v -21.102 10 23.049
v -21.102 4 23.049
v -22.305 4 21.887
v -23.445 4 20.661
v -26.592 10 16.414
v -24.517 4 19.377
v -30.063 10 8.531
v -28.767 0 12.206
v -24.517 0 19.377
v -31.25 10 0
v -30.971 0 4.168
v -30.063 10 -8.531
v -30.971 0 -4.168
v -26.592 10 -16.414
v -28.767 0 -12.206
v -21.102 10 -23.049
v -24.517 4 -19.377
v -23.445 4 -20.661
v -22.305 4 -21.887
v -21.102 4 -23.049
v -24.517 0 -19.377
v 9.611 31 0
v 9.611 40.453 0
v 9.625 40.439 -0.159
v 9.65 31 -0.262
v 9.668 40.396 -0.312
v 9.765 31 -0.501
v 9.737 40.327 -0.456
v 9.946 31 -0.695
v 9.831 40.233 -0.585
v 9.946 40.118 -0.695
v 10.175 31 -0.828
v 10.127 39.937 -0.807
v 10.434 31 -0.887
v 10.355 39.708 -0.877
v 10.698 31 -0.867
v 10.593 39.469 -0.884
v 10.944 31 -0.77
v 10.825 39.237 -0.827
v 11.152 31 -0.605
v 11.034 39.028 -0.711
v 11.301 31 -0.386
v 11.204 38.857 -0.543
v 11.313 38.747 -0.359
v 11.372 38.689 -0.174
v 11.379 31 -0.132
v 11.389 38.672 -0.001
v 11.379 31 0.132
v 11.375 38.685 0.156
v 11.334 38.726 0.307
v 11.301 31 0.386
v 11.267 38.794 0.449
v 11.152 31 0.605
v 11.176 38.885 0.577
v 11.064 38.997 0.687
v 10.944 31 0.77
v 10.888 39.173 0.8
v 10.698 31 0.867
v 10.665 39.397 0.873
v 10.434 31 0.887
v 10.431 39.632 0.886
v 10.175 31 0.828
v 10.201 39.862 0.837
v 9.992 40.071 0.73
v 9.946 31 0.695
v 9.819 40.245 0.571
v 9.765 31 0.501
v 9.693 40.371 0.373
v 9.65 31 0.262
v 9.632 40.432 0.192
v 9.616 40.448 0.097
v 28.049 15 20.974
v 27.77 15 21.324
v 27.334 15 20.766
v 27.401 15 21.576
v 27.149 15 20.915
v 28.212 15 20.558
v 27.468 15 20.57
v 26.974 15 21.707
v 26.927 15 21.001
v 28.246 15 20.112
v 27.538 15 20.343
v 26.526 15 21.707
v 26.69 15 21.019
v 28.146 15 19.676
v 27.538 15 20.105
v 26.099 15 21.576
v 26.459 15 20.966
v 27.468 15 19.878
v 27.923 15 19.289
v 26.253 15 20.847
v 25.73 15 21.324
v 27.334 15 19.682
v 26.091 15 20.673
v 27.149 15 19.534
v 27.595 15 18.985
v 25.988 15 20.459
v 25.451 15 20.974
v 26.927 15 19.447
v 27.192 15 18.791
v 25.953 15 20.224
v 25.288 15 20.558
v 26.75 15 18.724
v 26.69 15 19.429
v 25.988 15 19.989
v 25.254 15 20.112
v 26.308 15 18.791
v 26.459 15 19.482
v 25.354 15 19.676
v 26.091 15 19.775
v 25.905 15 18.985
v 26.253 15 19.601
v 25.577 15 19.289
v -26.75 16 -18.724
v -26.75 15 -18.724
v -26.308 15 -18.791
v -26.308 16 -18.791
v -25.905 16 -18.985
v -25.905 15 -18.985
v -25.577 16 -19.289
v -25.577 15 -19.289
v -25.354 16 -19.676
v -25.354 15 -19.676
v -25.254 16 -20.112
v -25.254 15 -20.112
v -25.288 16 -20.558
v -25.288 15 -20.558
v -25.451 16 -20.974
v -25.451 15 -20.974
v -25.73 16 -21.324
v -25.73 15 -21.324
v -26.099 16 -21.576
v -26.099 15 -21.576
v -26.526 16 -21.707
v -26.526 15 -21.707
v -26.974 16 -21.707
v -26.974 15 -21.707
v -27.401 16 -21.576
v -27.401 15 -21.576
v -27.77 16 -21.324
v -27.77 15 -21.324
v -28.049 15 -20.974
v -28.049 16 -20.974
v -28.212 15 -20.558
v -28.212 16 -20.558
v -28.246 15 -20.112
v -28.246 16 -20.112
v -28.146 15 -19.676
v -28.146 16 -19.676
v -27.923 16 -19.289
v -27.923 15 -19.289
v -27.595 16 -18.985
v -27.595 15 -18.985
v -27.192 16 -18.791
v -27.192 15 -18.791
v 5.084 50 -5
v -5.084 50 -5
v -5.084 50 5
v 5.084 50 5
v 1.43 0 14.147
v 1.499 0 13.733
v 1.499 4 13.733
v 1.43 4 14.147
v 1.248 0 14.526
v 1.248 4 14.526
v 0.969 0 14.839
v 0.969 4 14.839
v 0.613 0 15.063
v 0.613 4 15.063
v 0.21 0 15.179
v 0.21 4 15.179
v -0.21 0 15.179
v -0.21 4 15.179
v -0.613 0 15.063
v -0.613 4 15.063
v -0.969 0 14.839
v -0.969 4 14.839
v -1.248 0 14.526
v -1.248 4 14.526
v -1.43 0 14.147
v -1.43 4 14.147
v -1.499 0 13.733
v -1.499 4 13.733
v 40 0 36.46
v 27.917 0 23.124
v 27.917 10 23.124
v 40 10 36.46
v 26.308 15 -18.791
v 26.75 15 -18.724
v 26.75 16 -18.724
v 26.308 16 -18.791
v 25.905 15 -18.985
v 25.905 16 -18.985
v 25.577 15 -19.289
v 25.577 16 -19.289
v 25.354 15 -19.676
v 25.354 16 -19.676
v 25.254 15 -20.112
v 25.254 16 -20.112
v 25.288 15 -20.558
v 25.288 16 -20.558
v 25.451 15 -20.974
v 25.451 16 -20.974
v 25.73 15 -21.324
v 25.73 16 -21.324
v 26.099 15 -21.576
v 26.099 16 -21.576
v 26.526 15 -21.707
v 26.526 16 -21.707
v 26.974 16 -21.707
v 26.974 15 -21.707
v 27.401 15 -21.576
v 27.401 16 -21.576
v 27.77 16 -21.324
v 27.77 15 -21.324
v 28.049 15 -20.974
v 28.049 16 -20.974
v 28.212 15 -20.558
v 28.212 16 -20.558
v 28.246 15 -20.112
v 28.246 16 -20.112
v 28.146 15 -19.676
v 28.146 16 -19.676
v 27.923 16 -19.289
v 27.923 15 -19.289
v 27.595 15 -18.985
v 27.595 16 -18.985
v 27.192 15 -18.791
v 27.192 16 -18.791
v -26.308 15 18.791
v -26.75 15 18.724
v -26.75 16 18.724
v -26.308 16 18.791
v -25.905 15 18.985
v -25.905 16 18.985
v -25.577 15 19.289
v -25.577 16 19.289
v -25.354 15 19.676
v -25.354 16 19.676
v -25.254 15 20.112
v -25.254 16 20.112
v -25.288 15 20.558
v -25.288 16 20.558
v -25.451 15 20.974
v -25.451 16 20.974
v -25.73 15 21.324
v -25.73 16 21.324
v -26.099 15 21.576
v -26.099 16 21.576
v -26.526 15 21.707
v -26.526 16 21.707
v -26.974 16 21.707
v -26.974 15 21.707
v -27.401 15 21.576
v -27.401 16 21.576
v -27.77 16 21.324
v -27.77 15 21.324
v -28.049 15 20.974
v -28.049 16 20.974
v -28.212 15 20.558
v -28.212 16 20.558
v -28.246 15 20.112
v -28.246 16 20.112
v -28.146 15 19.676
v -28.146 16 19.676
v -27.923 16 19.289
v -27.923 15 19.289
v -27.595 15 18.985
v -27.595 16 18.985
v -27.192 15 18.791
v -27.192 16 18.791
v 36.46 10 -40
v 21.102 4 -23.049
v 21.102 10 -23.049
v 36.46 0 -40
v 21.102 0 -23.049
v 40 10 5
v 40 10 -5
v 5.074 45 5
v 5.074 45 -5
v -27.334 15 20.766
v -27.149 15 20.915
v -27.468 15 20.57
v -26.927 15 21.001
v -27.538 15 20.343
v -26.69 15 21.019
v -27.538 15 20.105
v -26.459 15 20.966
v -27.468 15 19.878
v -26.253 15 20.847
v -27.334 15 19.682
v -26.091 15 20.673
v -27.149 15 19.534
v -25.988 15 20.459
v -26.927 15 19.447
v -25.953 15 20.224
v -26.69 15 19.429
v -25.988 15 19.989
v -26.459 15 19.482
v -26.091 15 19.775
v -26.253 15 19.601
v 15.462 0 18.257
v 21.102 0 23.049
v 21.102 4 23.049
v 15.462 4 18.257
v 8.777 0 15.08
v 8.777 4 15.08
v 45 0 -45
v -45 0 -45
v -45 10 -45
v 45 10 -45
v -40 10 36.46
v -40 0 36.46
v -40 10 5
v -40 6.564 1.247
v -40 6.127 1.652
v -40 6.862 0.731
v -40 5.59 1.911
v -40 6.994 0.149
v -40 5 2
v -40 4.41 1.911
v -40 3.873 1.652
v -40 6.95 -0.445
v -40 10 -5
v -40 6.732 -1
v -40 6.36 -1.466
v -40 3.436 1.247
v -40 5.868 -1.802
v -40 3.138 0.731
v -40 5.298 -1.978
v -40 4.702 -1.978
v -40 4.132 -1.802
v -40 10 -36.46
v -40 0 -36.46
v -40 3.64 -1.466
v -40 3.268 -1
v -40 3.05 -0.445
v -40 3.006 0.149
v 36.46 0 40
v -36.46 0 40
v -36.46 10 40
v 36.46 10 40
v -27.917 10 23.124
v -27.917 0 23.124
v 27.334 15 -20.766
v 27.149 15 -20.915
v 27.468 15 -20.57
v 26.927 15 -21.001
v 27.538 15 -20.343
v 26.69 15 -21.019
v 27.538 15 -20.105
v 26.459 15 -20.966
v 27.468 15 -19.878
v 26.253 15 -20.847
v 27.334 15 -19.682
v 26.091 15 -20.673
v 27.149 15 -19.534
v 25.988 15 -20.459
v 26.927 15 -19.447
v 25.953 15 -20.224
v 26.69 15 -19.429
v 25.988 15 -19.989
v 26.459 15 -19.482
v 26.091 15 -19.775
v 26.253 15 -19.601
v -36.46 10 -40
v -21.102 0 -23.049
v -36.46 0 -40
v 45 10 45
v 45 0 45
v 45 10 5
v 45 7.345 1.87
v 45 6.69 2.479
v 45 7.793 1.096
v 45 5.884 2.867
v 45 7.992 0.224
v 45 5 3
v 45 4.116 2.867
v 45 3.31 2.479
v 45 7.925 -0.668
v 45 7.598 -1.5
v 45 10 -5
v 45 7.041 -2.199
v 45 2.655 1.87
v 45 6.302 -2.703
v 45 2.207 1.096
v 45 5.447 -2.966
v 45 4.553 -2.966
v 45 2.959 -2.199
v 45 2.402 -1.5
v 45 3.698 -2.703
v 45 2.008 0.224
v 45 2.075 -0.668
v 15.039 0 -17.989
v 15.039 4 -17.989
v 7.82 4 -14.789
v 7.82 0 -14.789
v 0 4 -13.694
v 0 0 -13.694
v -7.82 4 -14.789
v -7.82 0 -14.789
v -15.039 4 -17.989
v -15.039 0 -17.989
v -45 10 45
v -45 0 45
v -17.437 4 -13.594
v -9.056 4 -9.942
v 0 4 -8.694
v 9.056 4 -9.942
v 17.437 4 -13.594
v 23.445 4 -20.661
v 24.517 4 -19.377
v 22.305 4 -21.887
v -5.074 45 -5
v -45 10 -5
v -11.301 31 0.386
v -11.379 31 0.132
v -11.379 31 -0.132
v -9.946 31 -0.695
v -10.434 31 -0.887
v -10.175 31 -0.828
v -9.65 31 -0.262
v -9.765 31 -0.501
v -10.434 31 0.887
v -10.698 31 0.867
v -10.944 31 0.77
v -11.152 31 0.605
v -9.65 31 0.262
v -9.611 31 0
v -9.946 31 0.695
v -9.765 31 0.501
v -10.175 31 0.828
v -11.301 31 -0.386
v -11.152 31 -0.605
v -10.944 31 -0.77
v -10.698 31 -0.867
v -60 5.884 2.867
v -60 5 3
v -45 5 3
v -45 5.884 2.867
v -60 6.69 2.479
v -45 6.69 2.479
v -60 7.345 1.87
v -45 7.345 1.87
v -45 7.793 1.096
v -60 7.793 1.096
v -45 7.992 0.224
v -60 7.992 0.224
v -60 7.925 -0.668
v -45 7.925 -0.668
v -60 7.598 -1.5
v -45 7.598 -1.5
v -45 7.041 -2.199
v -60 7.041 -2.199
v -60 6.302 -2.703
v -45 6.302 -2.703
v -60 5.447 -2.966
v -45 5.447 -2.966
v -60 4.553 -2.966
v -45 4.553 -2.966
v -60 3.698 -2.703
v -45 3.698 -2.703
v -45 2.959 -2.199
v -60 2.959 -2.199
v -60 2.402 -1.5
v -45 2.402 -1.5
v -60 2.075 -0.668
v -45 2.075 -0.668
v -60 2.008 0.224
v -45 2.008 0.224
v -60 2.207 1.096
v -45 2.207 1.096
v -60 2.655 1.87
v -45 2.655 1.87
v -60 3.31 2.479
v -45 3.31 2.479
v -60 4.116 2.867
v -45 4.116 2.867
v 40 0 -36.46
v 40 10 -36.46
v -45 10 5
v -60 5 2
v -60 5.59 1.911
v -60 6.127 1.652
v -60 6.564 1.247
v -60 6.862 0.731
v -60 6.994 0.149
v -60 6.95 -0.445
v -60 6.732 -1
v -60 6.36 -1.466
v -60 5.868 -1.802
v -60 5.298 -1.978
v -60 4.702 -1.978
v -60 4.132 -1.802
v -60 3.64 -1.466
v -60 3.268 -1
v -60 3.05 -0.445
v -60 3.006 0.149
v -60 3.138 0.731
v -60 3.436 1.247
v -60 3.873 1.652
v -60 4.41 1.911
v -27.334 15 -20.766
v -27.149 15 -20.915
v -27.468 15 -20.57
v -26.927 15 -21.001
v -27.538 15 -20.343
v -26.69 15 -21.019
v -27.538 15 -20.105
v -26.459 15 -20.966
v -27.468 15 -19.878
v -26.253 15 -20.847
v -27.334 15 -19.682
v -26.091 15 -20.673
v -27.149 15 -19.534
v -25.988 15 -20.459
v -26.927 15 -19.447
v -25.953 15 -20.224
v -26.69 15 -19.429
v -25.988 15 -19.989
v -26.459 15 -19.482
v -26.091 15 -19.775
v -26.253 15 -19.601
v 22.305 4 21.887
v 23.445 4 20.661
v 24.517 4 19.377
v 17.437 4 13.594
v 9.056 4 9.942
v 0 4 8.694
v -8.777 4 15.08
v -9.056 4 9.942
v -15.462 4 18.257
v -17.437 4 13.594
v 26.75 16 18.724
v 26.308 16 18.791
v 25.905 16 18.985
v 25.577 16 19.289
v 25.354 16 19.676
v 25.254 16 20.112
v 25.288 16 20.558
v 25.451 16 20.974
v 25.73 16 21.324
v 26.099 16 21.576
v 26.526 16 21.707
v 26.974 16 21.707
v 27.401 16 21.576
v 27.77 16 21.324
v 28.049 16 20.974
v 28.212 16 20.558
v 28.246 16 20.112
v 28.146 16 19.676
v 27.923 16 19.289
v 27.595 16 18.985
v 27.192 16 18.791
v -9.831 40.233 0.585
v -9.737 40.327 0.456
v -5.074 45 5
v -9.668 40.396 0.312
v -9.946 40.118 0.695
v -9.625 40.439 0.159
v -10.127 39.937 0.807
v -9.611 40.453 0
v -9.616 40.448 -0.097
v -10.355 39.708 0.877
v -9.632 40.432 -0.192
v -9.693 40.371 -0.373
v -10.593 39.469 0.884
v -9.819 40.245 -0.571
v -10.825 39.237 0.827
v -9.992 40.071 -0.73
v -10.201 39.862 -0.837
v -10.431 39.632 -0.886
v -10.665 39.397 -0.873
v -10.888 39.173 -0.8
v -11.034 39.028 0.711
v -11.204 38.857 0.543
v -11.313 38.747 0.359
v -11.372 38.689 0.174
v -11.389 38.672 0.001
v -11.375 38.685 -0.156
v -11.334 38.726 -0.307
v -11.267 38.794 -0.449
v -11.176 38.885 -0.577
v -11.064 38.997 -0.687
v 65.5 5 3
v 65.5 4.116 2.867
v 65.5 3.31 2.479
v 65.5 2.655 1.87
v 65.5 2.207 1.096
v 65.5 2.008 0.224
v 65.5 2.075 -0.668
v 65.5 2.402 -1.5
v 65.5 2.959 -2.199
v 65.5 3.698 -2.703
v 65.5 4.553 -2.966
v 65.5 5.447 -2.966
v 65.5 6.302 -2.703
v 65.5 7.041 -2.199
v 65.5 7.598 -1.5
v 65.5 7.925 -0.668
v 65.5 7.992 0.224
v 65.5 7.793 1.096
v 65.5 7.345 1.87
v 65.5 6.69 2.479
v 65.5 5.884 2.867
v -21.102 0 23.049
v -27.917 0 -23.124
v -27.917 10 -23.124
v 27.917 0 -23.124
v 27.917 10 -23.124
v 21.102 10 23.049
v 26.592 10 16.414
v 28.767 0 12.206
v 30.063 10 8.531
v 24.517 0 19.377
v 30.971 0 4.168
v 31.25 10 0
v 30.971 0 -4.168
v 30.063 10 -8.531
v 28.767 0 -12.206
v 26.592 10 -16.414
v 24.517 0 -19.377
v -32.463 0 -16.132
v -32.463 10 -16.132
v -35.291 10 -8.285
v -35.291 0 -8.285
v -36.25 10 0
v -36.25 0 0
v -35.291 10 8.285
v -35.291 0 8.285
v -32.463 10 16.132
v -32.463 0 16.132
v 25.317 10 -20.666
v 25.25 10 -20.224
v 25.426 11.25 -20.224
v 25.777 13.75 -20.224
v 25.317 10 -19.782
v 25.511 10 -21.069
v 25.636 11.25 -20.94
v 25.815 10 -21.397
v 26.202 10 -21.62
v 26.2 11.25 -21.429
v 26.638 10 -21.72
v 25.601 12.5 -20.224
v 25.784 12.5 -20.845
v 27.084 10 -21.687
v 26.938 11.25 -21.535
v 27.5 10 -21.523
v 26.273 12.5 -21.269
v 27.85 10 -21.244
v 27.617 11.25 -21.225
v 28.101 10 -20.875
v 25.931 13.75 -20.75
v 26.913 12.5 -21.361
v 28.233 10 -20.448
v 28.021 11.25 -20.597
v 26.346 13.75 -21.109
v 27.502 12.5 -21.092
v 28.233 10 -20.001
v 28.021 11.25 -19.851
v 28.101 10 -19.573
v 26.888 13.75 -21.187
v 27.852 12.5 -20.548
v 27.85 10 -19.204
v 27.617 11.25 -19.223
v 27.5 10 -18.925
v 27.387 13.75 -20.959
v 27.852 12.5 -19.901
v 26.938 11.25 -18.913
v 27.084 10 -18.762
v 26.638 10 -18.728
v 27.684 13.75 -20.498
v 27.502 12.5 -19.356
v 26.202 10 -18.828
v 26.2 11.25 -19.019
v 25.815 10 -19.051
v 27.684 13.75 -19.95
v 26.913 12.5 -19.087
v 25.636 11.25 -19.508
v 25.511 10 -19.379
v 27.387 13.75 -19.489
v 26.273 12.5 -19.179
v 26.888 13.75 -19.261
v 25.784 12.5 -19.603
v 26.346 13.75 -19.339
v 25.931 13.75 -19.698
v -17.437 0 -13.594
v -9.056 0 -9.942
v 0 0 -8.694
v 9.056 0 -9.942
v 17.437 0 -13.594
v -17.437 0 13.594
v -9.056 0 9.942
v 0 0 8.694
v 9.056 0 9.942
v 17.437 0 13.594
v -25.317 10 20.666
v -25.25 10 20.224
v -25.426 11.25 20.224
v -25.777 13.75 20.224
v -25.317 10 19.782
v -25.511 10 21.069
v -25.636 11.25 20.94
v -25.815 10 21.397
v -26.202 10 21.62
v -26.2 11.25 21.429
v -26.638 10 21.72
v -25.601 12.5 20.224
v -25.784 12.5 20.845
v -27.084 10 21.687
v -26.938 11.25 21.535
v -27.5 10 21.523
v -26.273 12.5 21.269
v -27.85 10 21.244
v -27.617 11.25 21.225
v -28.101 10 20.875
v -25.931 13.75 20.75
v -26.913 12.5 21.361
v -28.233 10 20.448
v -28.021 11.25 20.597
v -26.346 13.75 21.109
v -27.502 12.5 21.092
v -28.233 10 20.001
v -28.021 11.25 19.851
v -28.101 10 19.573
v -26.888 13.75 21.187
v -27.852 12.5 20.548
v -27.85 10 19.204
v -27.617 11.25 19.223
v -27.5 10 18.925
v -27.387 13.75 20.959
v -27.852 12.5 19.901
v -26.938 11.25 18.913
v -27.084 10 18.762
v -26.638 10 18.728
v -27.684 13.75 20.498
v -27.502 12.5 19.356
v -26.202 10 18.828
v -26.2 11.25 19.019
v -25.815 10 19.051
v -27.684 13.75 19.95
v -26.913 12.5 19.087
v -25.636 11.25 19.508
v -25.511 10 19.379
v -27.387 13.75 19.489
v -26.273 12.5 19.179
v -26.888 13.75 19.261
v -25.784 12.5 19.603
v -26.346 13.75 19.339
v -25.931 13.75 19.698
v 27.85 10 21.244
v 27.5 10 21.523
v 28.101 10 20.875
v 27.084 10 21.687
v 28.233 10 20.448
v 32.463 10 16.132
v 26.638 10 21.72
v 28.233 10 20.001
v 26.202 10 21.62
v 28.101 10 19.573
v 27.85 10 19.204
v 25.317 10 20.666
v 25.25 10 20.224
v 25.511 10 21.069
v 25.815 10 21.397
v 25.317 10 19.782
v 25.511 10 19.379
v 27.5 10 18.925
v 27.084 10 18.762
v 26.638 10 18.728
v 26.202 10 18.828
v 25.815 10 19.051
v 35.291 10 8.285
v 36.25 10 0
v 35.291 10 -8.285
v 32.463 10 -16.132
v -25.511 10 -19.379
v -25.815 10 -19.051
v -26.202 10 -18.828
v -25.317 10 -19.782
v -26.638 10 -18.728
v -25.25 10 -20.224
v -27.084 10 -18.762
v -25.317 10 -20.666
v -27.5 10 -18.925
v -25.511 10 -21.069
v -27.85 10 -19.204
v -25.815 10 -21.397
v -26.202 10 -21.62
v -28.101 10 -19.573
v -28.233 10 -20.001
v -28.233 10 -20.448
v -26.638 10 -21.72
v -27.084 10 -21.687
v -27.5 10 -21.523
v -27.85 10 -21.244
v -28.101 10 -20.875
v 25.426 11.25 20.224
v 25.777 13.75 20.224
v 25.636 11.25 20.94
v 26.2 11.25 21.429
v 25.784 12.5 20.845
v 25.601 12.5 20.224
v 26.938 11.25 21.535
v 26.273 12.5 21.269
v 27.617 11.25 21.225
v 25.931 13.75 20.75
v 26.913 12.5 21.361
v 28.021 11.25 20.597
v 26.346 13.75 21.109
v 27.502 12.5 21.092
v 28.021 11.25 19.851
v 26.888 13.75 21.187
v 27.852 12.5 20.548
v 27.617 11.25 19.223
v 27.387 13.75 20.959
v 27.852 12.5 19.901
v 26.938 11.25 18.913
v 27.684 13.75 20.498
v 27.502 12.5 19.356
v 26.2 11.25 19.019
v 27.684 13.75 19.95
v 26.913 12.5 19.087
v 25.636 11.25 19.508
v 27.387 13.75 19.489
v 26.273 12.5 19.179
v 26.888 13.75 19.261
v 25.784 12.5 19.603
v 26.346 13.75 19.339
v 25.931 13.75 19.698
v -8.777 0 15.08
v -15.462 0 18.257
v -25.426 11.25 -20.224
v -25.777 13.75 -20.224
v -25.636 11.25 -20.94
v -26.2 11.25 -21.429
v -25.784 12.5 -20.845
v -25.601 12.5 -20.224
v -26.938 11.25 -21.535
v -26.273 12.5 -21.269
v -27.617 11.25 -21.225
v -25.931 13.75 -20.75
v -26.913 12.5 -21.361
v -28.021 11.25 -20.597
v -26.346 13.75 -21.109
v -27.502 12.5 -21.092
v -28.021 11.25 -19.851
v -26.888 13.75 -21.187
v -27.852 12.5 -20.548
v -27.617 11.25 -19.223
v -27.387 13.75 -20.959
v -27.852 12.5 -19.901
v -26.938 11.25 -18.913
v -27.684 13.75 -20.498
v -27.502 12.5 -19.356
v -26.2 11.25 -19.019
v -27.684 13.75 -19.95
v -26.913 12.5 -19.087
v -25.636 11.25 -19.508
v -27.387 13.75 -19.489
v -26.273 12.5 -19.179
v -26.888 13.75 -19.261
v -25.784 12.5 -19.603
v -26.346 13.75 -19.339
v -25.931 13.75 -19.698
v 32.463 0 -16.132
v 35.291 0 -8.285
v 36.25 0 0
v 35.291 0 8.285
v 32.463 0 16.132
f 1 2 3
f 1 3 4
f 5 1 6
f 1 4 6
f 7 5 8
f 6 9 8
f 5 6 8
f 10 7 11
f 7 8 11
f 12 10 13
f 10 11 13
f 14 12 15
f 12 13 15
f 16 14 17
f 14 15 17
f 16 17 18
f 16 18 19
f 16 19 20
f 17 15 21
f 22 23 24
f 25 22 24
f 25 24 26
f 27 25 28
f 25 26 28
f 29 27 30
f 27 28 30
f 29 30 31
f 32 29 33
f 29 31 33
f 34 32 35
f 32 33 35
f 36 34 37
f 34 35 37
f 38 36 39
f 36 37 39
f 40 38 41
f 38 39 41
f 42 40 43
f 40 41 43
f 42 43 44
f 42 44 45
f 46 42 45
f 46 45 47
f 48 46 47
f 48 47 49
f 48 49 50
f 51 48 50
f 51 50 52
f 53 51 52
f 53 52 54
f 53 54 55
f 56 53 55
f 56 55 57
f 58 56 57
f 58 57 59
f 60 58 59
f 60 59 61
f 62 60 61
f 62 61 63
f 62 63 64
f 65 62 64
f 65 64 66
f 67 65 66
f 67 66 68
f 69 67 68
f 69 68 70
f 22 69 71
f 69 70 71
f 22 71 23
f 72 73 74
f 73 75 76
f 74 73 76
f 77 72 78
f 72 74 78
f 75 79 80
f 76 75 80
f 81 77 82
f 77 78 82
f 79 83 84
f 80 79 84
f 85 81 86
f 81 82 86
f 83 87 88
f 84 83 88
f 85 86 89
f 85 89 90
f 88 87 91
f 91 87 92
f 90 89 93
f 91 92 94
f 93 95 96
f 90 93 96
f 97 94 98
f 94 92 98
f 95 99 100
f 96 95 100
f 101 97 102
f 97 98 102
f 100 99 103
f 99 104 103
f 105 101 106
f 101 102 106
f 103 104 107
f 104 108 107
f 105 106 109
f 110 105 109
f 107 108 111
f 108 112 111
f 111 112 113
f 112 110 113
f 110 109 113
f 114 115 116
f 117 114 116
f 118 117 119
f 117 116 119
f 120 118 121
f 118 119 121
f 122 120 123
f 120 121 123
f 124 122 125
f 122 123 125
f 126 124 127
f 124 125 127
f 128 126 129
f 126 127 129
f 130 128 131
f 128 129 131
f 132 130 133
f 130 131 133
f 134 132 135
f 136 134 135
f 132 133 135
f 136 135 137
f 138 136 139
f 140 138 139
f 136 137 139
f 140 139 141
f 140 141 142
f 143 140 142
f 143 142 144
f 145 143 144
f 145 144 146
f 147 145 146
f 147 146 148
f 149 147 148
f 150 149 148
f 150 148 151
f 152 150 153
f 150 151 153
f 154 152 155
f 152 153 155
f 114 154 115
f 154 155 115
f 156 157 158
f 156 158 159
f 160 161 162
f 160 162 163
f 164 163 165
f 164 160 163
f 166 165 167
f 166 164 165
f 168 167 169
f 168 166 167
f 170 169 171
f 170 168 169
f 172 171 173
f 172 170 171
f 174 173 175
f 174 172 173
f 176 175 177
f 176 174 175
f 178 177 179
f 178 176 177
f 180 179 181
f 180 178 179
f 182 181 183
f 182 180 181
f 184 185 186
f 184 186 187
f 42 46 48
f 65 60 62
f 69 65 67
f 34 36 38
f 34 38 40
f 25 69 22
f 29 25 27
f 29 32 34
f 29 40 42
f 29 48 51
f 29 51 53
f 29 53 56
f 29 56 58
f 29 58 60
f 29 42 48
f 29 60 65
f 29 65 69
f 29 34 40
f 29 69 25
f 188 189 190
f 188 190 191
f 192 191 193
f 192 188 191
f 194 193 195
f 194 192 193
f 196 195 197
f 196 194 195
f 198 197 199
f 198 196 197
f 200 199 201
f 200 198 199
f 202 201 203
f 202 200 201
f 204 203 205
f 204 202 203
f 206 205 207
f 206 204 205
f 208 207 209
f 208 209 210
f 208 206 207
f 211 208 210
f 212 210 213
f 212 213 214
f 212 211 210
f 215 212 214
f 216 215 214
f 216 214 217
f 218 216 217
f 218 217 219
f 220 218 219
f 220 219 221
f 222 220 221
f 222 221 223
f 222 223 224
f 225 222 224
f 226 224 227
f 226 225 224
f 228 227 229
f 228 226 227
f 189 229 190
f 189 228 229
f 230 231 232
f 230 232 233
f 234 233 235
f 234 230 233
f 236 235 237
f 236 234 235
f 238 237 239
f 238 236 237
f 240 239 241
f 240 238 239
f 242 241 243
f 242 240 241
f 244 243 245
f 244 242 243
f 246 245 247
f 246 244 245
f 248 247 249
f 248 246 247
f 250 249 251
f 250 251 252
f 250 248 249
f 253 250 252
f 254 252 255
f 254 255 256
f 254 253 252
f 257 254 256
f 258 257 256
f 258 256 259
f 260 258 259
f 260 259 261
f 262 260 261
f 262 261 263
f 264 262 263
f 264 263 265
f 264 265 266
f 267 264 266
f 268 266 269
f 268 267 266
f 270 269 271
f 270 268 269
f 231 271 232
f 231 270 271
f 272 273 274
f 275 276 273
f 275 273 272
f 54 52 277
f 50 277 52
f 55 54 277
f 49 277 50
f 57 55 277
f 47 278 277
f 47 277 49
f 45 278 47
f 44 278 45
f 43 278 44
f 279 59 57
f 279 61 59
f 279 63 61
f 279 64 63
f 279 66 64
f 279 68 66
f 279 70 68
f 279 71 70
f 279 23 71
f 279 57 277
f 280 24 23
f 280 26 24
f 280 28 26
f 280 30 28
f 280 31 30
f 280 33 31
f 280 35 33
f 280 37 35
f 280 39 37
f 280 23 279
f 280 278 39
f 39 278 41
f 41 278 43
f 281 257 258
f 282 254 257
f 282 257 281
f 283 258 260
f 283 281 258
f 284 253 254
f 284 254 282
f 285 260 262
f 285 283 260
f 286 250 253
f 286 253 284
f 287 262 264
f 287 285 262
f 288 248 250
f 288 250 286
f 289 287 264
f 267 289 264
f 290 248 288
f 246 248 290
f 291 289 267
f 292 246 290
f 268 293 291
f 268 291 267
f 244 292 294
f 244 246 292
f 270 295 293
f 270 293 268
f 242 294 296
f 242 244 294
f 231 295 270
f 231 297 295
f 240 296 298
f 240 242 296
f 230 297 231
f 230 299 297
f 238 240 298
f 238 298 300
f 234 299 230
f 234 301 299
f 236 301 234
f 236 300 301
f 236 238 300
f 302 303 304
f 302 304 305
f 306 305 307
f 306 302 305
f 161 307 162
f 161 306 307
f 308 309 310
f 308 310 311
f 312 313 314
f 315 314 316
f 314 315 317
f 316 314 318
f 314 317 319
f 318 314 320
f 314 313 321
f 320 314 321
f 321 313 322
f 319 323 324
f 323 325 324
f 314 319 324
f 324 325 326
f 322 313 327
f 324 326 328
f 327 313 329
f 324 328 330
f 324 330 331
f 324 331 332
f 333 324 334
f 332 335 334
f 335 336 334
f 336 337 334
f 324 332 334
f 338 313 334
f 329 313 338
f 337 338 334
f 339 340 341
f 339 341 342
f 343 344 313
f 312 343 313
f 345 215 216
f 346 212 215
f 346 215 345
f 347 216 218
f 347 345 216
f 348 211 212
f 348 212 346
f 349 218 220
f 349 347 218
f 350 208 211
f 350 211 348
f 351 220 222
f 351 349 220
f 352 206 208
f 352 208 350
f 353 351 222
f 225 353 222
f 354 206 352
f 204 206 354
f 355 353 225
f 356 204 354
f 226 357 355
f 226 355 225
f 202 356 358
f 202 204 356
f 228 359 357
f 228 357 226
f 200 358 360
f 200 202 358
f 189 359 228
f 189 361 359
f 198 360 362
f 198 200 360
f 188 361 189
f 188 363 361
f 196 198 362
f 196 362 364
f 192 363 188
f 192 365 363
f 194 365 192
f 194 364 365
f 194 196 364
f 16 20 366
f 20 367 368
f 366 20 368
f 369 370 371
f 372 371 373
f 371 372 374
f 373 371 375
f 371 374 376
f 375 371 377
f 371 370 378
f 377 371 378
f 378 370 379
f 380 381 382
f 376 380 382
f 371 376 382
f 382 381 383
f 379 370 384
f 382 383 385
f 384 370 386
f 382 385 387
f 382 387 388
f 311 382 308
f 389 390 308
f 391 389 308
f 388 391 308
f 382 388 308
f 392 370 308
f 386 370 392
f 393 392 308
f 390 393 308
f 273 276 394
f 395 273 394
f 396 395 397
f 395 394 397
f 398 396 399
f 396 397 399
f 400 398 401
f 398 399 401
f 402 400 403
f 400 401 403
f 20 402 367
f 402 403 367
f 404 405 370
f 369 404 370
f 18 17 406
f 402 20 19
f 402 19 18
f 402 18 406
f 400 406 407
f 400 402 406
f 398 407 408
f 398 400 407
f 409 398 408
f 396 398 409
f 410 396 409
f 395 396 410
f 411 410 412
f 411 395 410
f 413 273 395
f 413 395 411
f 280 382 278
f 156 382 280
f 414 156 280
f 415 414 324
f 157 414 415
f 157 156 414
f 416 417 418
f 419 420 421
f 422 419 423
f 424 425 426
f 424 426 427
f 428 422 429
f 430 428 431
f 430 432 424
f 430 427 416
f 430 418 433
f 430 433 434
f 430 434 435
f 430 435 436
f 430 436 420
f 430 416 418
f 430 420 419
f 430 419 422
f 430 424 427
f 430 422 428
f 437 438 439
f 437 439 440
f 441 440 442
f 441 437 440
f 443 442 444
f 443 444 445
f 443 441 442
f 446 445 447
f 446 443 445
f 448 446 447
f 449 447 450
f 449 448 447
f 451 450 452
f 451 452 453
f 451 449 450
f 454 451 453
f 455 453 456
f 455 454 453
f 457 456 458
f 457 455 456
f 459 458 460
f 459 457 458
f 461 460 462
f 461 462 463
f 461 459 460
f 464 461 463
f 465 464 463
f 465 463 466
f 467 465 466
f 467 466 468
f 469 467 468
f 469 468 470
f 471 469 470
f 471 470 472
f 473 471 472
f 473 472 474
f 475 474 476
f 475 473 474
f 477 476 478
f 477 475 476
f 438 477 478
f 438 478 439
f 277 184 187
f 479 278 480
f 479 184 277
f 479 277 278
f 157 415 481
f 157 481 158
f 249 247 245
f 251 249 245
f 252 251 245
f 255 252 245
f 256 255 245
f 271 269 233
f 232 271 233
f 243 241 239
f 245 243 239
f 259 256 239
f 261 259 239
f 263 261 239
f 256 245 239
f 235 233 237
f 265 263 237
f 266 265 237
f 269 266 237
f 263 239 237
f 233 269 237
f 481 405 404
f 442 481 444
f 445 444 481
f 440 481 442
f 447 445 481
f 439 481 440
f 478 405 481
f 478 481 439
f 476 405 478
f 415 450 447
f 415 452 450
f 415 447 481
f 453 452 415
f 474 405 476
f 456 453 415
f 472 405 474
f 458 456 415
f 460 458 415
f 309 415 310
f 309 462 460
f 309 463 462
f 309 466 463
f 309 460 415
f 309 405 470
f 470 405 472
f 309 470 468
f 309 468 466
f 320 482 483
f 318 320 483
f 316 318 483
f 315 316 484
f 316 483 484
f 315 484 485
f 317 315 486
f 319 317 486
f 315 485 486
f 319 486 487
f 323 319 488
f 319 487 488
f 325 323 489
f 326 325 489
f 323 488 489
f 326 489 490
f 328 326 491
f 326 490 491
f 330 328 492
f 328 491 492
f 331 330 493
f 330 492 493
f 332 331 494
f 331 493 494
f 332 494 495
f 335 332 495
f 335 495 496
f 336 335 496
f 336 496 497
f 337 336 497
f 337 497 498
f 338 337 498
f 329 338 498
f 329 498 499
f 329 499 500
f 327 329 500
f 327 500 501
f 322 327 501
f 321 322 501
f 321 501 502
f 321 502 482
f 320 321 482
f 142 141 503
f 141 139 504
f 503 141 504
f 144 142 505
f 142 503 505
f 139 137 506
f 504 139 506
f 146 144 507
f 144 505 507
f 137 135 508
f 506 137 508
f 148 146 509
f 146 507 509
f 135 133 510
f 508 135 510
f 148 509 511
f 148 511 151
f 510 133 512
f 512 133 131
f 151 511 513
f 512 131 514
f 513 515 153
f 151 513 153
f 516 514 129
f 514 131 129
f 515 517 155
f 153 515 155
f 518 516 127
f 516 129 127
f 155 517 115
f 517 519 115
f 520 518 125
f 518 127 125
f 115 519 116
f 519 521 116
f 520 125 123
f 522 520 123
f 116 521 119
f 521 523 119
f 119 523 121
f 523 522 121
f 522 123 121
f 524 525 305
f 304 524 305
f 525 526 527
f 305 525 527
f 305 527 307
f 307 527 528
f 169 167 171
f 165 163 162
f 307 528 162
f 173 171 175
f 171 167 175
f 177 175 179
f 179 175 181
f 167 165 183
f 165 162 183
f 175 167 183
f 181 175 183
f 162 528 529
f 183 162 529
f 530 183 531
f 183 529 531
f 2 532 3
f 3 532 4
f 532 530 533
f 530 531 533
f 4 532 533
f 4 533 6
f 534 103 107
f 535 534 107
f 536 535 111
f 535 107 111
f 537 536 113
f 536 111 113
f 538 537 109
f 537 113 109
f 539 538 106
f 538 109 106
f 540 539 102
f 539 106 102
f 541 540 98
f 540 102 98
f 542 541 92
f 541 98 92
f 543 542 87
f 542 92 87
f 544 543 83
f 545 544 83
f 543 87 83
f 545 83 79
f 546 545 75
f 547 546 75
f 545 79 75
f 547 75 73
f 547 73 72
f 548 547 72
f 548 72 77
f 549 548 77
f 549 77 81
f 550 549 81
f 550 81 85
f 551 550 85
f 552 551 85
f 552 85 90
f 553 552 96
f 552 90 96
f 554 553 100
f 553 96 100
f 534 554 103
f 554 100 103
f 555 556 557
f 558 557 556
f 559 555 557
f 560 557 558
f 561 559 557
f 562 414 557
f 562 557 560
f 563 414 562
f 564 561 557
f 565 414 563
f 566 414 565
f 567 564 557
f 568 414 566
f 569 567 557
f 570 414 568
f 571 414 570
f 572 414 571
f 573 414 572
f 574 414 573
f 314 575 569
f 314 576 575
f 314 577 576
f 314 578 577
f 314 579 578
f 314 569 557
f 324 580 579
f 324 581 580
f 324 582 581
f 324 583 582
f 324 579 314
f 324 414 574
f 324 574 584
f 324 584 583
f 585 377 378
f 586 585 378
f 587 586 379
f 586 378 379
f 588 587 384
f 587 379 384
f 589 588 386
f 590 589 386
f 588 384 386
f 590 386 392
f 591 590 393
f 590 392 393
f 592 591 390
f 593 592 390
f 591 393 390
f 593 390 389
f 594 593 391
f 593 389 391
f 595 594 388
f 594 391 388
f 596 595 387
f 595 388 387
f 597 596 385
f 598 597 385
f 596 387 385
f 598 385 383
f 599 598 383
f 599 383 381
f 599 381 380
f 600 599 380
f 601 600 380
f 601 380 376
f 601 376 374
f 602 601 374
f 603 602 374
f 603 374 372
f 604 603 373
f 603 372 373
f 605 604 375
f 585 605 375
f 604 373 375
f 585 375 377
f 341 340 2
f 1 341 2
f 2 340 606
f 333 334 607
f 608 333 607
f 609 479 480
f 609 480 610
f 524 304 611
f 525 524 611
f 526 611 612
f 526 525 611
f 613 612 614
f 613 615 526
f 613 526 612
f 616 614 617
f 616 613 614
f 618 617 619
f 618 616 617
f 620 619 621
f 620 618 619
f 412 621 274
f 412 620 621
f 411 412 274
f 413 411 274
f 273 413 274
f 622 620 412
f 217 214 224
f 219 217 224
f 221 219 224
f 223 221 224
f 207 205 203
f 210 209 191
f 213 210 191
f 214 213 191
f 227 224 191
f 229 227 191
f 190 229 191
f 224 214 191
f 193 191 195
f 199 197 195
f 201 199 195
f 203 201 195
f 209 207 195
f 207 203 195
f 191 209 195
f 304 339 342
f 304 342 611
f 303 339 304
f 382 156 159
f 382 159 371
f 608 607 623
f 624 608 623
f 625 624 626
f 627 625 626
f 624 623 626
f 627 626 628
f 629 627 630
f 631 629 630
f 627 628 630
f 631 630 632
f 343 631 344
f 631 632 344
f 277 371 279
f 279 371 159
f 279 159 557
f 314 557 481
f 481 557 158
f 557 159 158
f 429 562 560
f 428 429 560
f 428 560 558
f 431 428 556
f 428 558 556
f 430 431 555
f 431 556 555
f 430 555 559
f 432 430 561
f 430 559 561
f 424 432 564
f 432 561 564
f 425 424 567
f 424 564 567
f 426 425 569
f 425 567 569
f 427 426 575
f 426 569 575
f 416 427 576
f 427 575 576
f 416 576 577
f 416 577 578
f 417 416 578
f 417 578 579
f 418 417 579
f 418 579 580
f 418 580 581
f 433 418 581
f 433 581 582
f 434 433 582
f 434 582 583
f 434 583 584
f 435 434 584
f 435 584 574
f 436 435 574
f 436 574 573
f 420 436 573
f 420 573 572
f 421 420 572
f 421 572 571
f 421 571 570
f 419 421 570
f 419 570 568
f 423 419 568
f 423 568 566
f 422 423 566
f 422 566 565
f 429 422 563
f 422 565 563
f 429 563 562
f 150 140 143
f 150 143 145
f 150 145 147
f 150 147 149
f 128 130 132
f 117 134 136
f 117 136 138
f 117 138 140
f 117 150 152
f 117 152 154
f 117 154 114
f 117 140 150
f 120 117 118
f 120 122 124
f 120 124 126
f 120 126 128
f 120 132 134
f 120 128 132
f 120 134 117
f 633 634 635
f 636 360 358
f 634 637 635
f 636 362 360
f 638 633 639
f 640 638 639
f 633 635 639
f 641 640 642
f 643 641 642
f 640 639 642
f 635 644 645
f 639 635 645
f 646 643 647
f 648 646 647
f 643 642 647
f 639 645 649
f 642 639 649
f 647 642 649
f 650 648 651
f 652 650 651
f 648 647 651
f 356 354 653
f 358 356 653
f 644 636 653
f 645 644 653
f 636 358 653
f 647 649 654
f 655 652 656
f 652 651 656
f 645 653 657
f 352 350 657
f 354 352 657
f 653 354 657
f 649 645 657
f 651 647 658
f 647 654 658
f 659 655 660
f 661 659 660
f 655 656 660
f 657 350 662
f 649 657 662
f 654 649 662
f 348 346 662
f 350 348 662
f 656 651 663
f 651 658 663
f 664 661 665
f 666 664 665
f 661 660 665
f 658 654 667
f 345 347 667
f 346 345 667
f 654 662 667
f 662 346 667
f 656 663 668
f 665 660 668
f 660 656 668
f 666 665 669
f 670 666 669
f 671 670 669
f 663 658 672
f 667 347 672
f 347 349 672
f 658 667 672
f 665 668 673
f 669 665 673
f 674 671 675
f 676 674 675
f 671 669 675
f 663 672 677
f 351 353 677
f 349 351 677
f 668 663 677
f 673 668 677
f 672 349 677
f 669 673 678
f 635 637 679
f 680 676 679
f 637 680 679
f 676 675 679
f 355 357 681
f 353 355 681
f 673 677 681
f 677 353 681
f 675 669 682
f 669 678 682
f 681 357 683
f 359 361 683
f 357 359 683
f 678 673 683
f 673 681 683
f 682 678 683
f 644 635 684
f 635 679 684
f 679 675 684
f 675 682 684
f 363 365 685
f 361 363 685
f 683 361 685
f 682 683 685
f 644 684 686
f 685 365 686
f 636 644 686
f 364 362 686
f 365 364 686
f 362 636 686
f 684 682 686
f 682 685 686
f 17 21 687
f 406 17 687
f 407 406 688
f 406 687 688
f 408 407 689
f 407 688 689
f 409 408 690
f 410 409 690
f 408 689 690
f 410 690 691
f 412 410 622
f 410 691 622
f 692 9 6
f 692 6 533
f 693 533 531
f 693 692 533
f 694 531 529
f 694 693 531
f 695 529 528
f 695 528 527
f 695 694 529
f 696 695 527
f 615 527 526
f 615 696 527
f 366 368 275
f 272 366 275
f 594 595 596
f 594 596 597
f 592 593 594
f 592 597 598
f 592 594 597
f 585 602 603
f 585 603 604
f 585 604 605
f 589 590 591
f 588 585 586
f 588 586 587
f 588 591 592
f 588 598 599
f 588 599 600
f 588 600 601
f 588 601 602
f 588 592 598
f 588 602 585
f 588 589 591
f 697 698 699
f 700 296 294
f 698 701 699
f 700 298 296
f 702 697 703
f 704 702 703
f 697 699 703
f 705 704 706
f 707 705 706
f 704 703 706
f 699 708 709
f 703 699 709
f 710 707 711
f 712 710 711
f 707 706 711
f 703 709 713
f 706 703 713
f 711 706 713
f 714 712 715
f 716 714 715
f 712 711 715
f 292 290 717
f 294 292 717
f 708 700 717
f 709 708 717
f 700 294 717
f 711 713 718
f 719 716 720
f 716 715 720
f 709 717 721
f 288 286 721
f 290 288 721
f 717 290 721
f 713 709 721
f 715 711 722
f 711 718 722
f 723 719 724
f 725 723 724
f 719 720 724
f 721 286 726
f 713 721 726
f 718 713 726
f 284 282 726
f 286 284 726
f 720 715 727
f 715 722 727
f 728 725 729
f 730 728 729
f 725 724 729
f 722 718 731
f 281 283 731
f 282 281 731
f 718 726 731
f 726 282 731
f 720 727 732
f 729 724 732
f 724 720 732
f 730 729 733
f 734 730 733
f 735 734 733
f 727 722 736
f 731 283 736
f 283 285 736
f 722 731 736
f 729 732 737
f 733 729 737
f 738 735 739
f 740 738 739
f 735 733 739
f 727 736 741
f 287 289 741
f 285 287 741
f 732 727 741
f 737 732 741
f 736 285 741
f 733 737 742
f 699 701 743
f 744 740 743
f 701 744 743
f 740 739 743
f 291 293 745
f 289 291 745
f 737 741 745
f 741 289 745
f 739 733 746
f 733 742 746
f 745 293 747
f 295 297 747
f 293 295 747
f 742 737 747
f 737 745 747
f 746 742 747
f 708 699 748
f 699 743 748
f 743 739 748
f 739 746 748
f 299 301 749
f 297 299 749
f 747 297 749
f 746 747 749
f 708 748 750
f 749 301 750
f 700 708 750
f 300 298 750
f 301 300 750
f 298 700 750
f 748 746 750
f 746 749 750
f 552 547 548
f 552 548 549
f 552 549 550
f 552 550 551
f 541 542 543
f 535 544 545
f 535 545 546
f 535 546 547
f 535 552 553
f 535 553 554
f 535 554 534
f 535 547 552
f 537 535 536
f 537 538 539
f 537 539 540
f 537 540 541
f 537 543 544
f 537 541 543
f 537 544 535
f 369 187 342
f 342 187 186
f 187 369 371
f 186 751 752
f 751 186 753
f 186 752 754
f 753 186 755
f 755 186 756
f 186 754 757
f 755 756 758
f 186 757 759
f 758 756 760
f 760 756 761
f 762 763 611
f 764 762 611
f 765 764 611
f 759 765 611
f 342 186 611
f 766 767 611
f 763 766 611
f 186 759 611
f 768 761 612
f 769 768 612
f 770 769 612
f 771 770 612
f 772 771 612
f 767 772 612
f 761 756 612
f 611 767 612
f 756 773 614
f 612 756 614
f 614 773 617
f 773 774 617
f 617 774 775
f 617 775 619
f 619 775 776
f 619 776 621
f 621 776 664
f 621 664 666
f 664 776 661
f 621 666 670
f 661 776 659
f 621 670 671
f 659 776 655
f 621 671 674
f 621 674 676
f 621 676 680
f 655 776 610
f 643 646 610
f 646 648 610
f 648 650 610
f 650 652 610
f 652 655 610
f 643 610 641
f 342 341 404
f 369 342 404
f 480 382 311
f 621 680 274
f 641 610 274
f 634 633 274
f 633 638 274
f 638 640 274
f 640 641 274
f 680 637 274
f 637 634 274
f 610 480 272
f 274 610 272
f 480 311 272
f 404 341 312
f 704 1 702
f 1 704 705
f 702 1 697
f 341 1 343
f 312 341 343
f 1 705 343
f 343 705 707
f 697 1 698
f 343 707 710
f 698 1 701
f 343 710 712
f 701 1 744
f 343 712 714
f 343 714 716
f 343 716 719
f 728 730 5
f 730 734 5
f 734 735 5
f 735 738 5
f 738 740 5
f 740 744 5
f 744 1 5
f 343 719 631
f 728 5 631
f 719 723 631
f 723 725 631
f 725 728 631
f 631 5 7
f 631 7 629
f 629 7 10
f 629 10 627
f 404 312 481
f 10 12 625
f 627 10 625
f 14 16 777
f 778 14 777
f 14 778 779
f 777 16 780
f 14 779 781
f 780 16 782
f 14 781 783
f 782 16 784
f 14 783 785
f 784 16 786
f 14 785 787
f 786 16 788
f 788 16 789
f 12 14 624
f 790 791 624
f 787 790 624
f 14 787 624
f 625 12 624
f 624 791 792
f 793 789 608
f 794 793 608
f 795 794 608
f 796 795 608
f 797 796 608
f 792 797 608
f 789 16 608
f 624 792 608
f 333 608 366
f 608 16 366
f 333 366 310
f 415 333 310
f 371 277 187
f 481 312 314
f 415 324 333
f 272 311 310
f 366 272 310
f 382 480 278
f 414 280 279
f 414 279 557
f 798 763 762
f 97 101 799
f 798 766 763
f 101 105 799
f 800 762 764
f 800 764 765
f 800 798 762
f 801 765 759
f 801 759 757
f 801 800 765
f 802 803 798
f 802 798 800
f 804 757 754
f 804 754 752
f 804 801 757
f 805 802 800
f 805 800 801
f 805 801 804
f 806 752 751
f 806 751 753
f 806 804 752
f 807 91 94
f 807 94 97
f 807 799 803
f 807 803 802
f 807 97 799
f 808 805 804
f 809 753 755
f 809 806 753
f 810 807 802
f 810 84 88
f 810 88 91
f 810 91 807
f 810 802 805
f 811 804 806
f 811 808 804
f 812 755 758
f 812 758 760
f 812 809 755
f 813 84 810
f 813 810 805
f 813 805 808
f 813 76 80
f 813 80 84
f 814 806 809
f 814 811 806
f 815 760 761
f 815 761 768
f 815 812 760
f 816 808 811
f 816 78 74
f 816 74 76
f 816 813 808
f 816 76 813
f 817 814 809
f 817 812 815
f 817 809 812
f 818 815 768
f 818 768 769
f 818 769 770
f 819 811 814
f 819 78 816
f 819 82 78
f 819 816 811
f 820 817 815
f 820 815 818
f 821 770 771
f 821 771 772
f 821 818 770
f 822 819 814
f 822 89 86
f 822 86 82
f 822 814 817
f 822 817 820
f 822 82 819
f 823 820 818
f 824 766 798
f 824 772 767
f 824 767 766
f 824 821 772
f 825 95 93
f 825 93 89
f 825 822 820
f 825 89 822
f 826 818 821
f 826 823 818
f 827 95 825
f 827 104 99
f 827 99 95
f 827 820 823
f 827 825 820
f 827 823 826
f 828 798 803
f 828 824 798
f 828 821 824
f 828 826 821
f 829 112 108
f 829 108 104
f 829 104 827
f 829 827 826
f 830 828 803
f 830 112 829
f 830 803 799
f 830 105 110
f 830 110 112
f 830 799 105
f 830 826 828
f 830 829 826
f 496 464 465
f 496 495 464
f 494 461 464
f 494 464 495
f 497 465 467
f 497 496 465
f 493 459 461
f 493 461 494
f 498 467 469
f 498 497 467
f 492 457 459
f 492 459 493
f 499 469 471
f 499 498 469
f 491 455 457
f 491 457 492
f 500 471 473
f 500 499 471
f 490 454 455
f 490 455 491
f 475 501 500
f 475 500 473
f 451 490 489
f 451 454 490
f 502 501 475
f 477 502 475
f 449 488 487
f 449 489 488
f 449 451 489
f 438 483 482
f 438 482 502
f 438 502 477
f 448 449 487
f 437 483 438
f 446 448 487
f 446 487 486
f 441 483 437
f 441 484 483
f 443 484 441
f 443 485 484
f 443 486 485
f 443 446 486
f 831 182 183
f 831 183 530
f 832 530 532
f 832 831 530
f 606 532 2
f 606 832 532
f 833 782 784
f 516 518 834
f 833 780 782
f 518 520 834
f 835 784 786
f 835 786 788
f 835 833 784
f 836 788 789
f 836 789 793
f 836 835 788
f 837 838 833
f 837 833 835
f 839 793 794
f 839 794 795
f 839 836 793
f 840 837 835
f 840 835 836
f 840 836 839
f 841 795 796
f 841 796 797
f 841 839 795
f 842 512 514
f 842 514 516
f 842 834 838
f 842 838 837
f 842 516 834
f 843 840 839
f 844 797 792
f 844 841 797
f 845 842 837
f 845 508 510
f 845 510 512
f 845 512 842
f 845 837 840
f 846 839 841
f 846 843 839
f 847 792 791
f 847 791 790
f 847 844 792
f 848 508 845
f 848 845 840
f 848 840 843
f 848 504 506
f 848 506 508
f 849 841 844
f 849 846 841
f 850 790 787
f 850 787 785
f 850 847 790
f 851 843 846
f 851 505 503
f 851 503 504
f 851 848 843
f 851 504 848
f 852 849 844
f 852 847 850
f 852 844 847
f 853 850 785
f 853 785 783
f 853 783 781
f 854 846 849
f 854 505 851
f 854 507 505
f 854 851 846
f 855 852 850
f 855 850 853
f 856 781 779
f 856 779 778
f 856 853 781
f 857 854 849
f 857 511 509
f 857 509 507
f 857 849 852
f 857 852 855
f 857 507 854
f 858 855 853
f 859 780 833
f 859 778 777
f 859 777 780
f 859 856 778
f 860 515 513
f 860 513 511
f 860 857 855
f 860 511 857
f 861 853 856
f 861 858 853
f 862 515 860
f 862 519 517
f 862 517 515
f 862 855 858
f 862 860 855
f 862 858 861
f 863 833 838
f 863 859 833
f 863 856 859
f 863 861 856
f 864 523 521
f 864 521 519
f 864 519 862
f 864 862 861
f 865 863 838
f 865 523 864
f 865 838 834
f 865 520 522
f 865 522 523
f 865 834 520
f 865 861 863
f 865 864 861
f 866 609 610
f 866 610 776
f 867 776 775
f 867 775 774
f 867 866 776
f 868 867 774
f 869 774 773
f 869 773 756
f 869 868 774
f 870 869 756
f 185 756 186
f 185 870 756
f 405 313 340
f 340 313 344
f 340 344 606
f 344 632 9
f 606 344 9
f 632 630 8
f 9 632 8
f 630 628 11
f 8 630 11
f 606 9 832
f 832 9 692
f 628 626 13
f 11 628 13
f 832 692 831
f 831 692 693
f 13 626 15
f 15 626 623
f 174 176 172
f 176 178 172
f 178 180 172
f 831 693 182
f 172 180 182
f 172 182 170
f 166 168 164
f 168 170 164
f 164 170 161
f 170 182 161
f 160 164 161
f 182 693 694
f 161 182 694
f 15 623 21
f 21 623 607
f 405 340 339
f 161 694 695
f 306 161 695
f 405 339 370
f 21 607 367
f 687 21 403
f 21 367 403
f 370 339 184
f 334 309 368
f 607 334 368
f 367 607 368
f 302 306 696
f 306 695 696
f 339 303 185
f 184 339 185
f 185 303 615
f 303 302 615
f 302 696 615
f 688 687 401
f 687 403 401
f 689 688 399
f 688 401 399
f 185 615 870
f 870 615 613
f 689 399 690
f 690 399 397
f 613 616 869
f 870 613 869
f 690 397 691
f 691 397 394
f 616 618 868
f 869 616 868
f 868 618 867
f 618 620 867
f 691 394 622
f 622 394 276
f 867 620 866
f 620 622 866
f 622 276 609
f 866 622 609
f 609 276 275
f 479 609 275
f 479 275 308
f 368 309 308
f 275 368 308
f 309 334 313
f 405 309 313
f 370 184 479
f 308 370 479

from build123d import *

# Parameters (mm, degrees)
SKETCH1_W                   = 90
SKETCH1_H                   = 90
SKETCH1_W_2                 = 80
SKETCH1_H_2                 = 80
BOSS_EXTRUDE1_DEPTH         = 10
SKETCH2_R                   = 3
BOSS_EXTRUDE2_DEPTH         = 20.5
BOSS_EXTRUDE3_DEPTH         = 5
BOSS_EXTRUDE3_DEPTH_BACK    = 5
BOSS_EXTRUDE4_START         = 15
SKETCH4_R                   = 3
BOSS_EXTRUDE4_DEPTH         = 15
BOSS_EXTRUDE5_DEPTH         = 10
BOSS_EXTRUDE6_DEPTH         = 4
SKETCH8_R                   = 1.5
BOSS_EXTRUDE7_DEPTH         = 5
BOSS_EXTRUDE7_TAPER         = 8
SKETCH9_R                   = 1.5
POST_FOR_RUBBER_BANDS_DEPTH = 1
MIRROR3_COPY_1_SKETCH_R     = 1.5
MIRROR3_COPY_1_DEPTH        = 5
MIRROR3_COPY_1_TAPER        = 8
MIRROR3_COPY_2_SKETCH_R     = 1.5
MIRROR3_COPY_2_DEPTH        = 1
SKETCH12_R                  = 0.889
BOSS_EXTRUDE10_DEPTH        = 10
CUT_EXTRUDE1_REACH          = 144.391
SKETCH13_R                  = 2


with BuildPart() as part:
    # Sketch1 → Boss-Extrude1 (new body)
    with BuildSketch(Plane(origin=(0, 0, 0), x_dir=(1, 0, 0), z_dir=(0, 1, 0))):
        Rectangle(SKETCH1_W, SKETCH1_H)
        Rectangle(SKETCH1_W_2, SKETCH1_H_2, mode=Mode.SUBTRACT)
    extrude(amount=BOSS_EXTRUDE1_DEPTH)

    # Sketch2 → Boss-Extrude2 (add)
    with BuildSketch(Plane(origin=(45, 0, 0), x_dir=(0, 0, -1), z_dir=(1, 0, 0))):
        with Locations(Location((0, 5, 0), (0, 0, 180))):
            Circle(SKETCH2_R)
    extrude(amount=BOSS_EXTRUDE2_DEPTH)

    # Sketch3 → Boss-Extrude3 (add, two sides: drawn at the far end of the back side and taken through both)
    with BuildSketch(Plane.XY.offset(-BOSS_EXTRUDE3_DEPTH_BACK)):
        Polygon((-40, 10), (-45, 10), (-5.084464777, 50), (5.084464777, 50), (45, 10), (40, 10), (5.07390668, 45), (-5.07390668, 45), align=None)
    extrude(amount=BOSS_EXTRUDE3_DEPTH + BOSS_EXTRUDE3_DEPTH_BACK)

    # Sketch4 → Boss-Extrude4 (add)
    with BuildSketch(Plane.ZY.offset(45).offset(BOSS_EXTRUDE4_START)):
        with Locations((0, 5)):
            Circle(SKETCH4_R)
    extrude(amount=-BOSS_EXTRUDE4_DEPTH)

    # Sketch5 → Boss-Extrude5 (add)
    with BuildSketch(Plane(origin=(0, 0, 0), x_dir=(1, 0, 0), z_dir=(0, 1, 0))):
        with BuildLine():
            Line((-40, -36.460175656), (-40, -40))
            Line((-40, -40), (-36.460175656, -40))
            Line((-36.460175656, -40), (-21.10179716, -23.0494394))
            ThreePointArc((-21.10179716, -23.0494394), (-31.25, 0), (-21.10179716, 23.0494394))
            Line((-21.10179716, 23.0494394), (-36.460175656, 40))
            Line((-36.460175656, 40), (-40, 40))
            Line((-40, 40), (-40, 36.460175656))
            Line((-40, 36.460175656), (-27.916615548, 23.124123255))
            ThreePointArc((-27.916615548, 23.124123255), (-36.25, 0), (-27.916615548, -23.124123255))
            Line((-27.916615548, -23.124123255), (-40, -36.460175656))
        make_face()
    boss_extrude5 = extrude(amount=BOSS_EXTRUDE5_DEPTH)

    # Mirror1: Boss-Extrude5 across plane
    add(boss_extrude5.mirror(Plane(origin=(0, 0, 0), x_dir=(0, 0, 1), z_dir=(1, 0, 0))))

    # Sketch6 → Boss-Extrude6 (add)
    with BuildSketch(Plane(origin=(0, 0, 0), x_dir=(1, 0, 0), z_dir=(0, 1, 0))):
        with BuildLine():
            ThreePointArc((-21.10179716, 23.0494394), (-22.883440442, 21.281697619), (-24.517477668, 19.376681574))
            ThreePointArc((-24.517477668, 19.376681574), (0, 8.693728204), (24.517477668, 19.376681574))
            ThreePointArc((24.517477668, 19.376681574), (22.883440442, 21.281697619), (21.10179716, 23.0494394))
            ThreePointArc((21.10179716, 23.0494394), (0, 13.693728204), (-21.10179716, 23.0494394))
        make_face()
        with BuildLine():
            ThreePointArc((-24.517477668, -19.376681574), (0, -8.693728204), (24.517477668, -19.376681574))
            ThreePointArc((24.517477668, -19.376681574), (22.883440442, -21.281697619), (21.10179716, -23.0494394))
            ThreePointArc((21.10179716, -23.0494394), (12.223024974, -16.450534785), (1.499479621, -13.733235994))
            ThreePointArc((1.499479621, -13.733235994), (0, -15.193728204), (-1.499479621, -13.733235994))
            ThreePointArc((-1.499479621, -13.733235994), (-12.223024974, -16.450534785), (-21.10179716, -23.0494394))
            ThreePointArc((-21.10179716, -23.0494394), (-22.883440442, -21.281697619), (-24.517477668, -19.376681574))
        make_face()
    extrude(amount=BOSS_EXTRUDE6_DEPTH)

    # Sketch8 → Boss-Extrude7 (add)
    with BuildSketch(Plane(origin=(0, 10, 0), x_dir=(1, 0, 0), z_dir=(0, 1, 0))):
        with Locations((-26.75, 20.224123255)):
            Circle(SKETCH8_R)
    boss_extrude7 = extrude(amount=BOSS_EXTRUDE7_DEPTH, taper=BOSS_EXTRUDE7_TAPER)

    # Sketch9 → Post for rubber bands (add)
    with BuildSketch(Plane(origin=(0, 15, 0), x_dir=(1, 0, 0), z_dir=(0, 1, 0))):
        with Locations(Location((-26.75, 20.224123255, 0), (0, 0, 270))):
            Circle(SKETCH9_R)
    post_for_rubber_bands = extrude(amount=POST_FOR_RUBBER_BANDS_DEPTH)

    # Mirror2: Boss-Extrude7, Post for rubber bands across plane
    add(boss_extrude7.mirror(Plane(origin=(0, 0, 0), x_dir=(0, 0, 1), z_dir=(1, 0, 0))))
    add(post_for_rubber_bands.mirror(Plane(origin=(0, 0, 0), x_dir=(0, 0, 1), z_dir=(1, 0, 0))))

    # Mirror3: Boss-Extrude7, Post for rubber bands across plane
    add(boss_extrude7.mirror(Plane.XY))
    add(post_for_rubber_bands.mirror(Plane.XY))

    # Mirror3 copy 1 sketch → Mirror3 copy 1 (add)
    with BuildSketch(Plane(origin=(0, 10, 0), x_dir=(-1, 0, 0), z_dir=(0, 1, 0))):
        with Locations((-26.75, 20.224123255)):
            Circle(MIRROR3_COPY_1_SKETCH_R)
    extrude(amount=MIRROR3_COPY_1_DEPTH, taper=MIRROR3_COPY_1_TAPER)

    # Mirror3 copy 2 sketch → Mirror3 copy 2 (add)
    with BuildSketch(Plane(origin=(0, 15, 0), x_dir=(-1, 0, 0), z_dir=(0, 1, 0))):
        with Locations(Location((-26.75, 20.224123255, 0), (0, 0, 270))):
            Circle(MIRROR3_COPY_2_SKETCH_R)
    extrude(amount=MIRROR3_COPY_2_DEPTH)

    # Sketch12 → Boss-Extrude10 (add)
    with BuildSketch(Plane(origin=(0, 41, 0), x_dir=(-1, 0, 0), z_dir=(0, -1, 0))):
        with Locations((-10.5, 0)):
            Circle(SKETCH12_R)
        with Locations(Location((10.5, 0, 0), (0, 0, 180))):
            Circle(SKETCH12_R)
    extrude(amount=BOSS_EXTRUDE10_DEPTH)

    # Sketch13 → Cut-Extrude1 (cut, up to next)
    with BuildSketch(Plane.ZY.offset(60), mode=Mode.PRIVATE) as cut_extrude1_sk1:
        with Locations((0, 5)):
            Circle(SKETCH13_R)
    cut_extrude1_tool1 = extrude(cut_extrude1_sk1.sketch, amount=-CUT_EXTRUDE1_REACH, mode=Mode.PRIVATE) & part.part
    add(cut_extrude1_tool1.solids().sort_by_distance((-60, 5, 0))[0], mode=Mode.SUBTRACT)


solid = part.part
